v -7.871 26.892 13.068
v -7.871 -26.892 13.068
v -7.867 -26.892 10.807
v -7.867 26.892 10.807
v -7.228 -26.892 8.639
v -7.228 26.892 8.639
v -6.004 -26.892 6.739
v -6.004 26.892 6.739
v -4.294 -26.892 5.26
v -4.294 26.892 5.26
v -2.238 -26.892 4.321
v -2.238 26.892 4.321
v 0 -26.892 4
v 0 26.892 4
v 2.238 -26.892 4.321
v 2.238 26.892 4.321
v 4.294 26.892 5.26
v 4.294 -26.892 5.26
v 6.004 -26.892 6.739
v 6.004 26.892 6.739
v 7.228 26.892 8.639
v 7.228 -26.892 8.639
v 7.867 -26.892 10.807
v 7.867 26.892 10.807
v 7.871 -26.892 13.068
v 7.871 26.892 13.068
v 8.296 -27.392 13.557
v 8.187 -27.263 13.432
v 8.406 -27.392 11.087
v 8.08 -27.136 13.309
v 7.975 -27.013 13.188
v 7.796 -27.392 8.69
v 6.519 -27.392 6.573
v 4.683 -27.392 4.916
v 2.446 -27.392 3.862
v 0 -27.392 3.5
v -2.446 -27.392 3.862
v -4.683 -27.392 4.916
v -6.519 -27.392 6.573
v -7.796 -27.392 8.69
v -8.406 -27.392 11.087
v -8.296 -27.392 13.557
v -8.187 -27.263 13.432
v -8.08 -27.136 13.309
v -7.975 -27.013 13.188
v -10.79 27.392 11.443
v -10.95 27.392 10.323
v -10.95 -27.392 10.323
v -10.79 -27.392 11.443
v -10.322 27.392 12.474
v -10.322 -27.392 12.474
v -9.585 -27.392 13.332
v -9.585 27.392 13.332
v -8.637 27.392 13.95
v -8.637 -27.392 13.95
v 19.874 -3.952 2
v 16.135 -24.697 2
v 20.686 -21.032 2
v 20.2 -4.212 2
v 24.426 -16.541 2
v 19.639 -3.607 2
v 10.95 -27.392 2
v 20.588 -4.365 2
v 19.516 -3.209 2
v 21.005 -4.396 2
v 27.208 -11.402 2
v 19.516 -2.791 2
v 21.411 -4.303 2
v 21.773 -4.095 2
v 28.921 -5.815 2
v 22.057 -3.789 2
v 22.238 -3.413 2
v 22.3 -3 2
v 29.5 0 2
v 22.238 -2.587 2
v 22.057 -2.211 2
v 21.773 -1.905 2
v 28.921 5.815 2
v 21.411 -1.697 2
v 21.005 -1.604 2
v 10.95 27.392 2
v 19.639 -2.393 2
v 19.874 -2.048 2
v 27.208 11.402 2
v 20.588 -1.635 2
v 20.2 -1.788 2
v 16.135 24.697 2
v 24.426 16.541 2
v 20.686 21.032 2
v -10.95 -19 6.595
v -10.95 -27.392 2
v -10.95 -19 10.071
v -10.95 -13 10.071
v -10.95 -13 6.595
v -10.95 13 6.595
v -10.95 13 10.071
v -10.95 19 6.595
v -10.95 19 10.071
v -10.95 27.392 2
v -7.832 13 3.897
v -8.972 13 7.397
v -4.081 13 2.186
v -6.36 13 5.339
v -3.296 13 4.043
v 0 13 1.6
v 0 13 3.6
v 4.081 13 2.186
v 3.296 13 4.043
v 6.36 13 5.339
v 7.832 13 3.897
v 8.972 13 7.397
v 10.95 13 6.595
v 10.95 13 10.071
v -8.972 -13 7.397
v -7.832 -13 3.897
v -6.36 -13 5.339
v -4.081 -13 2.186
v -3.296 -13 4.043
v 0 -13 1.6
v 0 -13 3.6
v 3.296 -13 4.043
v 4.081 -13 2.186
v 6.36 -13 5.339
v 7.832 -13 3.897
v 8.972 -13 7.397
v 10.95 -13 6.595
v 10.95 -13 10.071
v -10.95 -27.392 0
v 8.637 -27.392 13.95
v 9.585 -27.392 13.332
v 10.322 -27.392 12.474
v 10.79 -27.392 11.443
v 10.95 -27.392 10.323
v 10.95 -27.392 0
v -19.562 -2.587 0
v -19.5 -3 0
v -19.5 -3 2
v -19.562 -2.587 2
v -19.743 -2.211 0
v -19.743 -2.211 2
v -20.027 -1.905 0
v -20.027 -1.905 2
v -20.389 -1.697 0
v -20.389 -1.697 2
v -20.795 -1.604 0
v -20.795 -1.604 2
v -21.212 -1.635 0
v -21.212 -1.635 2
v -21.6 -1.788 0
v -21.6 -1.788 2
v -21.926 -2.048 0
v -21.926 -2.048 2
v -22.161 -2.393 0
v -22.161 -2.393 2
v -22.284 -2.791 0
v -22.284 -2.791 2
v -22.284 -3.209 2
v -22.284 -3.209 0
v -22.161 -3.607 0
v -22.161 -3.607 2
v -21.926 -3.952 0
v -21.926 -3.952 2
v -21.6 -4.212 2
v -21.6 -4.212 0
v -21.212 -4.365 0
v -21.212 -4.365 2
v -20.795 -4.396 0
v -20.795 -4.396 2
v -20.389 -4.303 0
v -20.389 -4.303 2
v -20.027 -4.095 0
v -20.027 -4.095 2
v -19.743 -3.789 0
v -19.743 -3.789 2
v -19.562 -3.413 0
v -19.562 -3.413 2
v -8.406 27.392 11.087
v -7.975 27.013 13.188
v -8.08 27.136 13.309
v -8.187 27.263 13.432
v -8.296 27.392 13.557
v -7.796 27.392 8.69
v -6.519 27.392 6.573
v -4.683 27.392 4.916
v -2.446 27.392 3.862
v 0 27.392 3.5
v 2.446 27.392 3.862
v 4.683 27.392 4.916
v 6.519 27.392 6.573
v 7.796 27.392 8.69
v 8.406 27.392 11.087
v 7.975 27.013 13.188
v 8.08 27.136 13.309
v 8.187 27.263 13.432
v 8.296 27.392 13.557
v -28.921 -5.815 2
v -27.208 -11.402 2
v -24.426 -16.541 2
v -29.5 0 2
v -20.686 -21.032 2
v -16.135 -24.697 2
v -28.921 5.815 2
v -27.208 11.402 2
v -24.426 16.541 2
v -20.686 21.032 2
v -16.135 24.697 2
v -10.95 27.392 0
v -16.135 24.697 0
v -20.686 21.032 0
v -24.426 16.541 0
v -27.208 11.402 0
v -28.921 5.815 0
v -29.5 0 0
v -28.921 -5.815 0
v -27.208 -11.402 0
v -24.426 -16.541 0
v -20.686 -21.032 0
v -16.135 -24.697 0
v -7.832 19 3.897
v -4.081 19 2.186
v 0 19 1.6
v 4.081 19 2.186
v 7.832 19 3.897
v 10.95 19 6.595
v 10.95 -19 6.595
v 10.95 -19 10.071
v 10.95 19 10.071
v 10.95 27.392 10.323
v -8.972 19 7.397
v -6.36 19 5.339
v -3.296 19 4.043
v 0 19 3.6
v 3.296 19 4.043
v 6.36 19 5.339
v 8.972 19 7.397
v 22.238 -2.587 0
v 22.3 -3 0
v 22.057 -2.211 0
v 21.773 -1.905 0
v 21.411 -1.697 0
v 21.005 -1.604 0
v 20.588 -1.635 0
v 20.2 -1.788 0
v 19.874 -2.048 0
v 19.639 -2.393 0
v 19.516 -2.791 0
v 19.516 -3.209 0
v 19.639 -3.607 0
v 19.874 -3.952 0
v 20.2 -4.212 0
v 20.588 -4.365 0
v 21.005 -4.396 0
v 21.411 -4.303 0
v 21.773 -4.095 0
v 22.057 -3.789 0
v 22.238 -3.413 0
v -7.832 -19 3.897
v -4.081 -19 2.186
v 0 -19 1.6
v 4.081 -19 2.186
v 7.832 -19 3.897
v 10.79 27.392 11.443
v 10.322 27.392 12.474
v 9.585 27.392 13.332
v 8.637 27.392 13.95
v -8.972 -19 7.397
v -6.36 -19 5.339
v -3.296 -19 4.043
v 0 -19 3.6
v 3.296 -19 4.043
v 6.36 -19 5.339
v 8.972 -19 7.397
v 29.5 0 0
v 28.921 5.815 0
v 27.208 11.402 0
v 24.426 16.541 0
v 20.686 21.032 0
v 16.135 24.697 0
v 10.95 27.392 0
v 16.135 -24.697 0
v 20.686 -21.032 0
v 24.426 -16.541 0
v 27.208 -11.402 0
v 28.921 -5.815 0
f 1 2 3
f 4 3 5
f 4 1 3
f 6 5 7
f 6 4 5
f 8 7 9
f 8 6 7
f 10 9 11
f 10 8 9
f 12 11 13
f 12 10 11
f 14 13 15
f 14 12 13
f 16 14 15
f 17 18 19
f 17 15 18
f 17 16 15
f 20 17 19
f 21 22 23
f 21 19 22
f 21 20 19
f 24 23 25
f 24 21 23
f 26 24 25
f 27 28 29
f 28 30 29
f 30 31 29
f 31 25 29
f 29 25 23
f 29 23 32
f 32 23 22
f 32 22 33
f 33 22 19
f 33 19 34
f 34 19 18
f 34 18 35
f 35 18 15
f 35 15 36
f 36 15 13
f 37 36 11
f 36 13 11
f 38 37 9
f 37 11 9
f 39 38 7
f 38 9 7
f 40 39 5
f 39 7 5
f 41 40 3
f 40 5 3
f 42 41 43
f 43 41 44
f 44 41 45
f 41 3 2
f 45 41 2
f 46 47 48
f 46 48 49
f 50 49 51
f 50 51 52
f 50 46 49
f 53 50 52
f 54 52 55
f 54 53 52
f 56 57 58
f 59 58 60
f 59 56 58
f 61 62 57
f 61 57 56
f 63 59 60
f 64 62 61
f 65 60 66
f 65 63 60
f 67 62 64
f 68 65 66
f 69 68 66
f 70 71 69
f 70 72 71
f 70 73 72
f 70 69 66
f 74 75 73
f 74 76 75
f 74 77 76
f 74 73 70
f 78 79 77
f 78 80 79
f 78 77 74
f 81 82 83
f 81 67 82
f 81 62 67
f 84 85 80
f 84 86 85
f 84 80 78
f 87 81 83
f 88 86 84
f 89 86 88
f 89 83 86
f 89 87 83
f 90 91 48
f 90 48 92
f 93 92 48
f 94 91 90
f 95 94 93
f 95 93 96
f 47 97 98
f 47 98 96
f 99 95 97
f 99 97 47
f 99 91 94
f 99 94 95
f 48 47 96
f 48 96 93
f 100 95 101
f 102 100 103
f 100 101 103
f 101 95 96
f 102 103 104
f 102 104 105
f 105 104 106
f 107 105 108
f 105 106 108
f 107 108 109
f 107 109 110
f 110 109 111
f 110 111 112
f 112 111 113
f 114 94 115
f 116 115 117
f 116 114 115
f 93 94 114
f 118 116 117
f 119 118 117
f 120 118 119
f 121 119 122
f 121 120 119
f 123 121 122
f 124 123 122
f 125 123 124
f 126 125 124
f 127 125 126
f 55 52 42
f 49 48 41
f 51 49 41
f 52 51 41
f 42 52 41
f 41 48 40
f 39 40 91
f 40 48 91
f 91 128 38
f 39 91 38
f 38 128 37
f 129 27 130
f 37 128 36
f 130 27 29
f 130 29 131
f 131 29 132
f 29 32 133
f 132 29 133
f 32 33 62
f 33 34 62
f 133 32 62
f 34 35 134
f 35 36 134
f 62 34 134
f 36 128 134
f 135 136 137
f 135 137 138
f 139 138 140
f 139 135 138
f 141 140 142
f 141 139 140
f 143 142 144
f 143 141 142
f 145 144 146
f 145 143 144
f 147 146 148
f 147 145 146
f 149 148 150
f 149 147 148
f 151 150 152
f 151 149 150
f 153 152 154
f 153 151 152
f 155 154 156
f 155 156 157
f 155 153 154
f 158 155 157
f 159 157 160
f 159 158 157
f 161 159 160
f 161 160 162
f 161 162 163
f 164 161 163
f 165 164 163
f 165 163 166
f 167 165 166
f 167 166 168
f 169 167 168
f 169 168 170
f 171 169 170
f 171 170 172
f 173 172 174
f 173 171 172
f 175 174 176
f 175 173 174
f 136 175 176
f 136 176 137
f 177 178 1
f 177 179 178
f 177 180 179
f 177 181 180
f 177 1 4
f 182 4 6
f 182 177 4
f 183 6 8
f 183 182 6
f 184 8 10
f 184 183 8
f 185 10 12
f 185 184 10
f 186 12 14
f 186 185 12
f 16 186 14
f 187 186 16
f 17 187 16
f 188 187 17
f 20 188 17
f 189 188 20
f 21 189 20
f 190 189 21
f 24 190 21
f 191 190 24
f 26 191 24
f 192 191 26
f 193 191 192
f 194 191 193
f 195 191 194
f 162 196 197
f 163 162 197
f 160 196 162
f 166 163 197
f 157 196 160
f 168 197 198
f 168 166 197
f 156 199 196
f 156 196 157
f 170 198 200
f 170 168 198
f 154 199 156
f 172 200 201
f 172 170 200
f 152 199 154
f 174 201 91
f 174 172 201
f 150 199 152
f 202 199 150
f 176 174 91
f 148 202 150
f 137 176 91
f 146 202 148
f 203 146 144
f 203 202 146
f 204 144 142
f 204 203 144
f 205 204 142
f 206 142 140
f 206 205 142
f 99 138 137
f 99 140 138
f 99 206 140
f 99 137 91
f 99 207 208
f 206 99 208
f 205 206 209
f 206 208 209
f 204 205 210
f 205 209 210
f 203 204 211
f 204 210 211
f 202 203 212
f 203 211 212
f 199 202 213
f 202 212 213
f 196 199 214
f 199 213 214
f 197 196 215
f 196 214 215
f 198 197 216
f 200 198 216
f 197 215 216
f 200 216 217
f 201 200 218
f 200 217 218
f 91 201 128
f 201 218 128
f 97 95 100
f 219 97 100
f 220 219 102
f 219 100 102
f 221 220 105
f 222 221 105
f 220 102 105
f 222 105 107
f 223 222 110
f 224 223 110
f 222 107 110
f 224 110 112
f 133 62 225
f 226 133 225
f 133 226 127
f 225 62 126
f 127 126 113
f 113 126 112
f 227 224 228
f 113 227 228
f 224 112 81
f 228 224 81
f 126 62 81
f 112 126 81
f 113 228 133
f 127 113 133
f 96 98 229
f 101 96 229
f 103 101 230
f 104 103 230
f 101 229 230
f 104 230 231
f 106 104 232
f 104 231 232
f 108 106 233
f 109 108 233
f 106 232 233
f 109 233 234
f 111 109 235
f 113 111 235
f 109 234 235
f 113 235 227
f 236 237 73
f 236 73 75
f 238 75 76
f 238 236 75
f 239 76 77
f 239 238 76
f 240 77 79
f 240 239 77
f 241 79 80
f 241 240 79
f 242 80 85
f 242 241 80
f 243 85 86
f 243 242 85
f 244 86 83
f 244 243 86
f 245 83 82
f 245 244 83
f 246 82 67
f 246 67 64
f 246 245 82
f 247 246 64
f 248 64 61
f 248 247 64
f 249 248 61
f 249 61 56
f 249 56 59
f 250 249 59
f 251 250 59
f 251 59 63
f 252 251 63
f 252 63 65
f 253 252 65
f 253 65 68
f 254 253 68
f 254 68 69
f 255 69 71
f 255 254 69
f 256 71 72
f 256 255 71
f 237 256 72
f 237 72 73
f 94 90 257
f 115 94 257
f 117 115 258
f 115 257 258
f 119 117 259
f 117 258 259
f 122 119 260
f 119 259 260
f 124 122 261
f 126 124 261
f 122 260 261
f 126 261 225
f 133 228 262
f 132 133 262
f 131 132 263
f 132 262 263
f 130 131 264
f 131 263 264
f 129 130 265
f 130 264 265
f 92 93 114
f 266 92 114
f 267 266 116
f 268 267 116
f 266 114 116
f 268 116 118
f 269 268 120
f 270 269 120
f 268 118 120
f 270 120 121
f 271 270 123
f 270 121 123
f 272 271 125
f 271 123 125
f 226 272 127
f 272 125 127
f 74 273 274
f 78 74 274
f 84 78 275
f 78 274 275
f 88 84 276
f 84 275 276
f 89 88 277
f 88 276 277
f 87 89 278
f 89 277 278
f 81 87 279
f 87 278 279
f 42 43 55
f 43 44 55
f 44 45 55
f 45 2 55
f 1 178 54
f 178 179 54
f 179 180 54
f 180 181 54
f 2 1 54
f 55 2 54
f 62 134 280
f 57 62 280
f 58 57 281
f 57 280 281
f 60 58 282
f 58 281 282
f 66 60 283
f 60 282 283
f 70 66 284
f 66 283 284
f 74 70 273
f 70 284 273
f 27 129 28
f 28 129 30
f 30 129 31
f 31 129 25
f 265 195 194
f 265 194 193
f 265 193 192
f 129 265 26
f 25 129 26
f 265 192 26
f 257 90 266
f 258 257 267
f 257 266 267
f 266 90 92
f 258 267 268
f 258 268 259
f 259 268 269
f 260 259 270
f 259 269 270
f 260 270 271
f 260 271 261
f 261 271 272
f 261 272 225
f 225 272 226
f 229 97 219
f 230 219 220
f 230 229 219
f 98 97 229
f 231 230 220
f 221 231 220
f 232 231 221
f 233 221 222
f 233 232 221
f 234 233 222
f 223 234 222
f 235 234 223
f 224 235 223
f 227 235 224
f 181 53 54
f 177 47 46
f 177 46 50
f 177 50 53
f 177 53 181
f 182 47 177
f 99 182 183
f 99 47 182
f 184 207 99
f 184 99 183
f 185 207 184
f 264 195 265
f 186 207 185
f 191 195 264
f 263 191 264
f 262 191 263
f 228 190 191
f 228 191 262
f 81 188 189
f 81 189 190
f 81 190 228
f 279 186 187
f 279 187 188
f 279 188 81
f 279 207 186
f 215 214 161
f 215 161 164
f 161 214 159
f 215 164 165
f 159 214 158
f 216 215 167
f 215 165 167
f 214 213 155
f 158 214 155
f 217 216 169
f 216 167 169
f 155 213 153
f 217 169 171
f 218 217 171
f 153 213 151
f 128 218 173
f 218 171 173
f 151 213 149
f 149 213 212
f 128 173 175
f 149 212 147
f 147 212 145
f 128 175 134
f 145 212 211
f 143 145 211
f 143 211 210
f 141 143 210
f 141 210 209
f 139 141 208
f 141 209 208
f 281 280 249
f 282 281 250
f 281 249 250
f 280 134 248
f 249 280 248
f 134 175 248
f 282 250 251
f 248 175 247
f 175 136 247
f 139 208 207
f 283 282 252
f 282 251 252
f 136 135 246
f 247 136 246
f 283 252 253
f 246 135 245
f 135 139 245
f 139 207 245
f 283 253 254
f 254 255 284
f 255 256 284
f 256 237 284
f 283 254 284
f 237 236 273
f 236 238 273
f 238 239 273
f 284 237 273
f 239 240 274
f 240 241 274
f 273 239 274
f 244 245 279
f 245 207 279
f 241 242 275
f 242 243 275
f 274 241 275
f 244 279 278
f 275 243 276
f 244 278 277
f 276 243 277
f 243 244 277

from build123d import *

# Parameters (mm, degrees)
F0_W          = 21.9
F0_H          = 54.784943187
F2_DEPTH      = 13.95
F0_R          = 1.4
F3_DEPTH      = 2
F1_R          = 7.95
F4_DEPTH      = 27.3934715935
F4_DEPTH_BACK = 27.3934715935
F7_R          = 14.5
F7_R_2        = 12.5
F8_R          = 14.5
F8_R_2        = 12.5
F9_DEPTH      = 3
F10_T1_DEPTH  = 59.6298977105
F11_T1_DEPTH  = 72.9200798033
F12_SIZE      = 0.5


# Not quite as in the source:
# - a fillet or chamfer that OpenCascade refuses, or shapes differently, is made with other operations: its cross-section is extruded or revolved along the edge and cut away or added


with BuildPart() as f2:
    # F0 (on Top) → F2 (new body)
    with BuildSketch(Plane.XY):
        Rectangle(F0_W, F0_H)
    extrude(amount=F2_DEPTH)

    # F0 (on Top) → F3 (join)
    with BuildSketch(Plane.XY):
        with BuildLine():
            ThreePointArc((10.95, -27.3924715935), (24.4261642507, -16.5412363504), (29.5, 0))
            ThreePointArc((29.5, 0), (24.4261642507, 16.5412363504), (10.95, 27.3924715935))
            Line((10.95, 27.3924715935), (10.95, -27.3924715935))
        make_face()
        with Locations((20.9, -3)):
            Circle(F0_R, mode=Mode.SUBTRACT)
        with BuildLine():
            Line((-10.95, -27.3924715935), (-10.95, 27.3924715935))
            ThreePointArc((-10.95, 27.3924715935), (-29.5, 0), (-10.95, -27.3924715935))
        make_face()
        with Locations((-20.9, -3)):
            Circle(F0_R, mode=Mode.SUBTRACT)
    extrude(amount=F3_DEPTH)

    # F1 (on Front) → F4 (cut, two sides)
    with BuildSketch(Plane.XZ) as f4_sk:
        with Locations((0, 11.95)):
            Circle(F1_R)
    extrude(amount=-F4_DEPTH, mode=Mode.SUBTRACT)
    extrude(f4_sk.sketch, amount=F4_DEPTH_BACK, mode=Mode.SUBTRACT)

    # F7 (on offset) + F8 (on offset) → F9 (cut, symmetric)
    with BuildSketch(Plane.XZ.offset(16)):
        with Locations((0, 16.1)):
            Circle(F7_R)
        with Locations((0, 16.1)):
            Circle(F7_R_2, mode=Mode.SUBTRACT)
    with BuildSketch(Plane.XZ.offset(-16)):
        with Locations((0, 16.1)):
            Circle(F8_R)
        with Locations((0, 16.1)):
            Circle(F8_R_2, mode=Mode.SUBTRACT)
    extrude(amount=F9_DEPTH, both=True, mode=Mode.SUBTRACT)

    # F10: chamfer of 1 on 2 edges, made by hand

    # F10_s2 → F10_t1 (cut)
    with BuildSketch(Plane.XZ.offset(-29.8149488552)):
        with BuildLine():
            Line((-7.8447816072, 13.0377503134), (-8.6628360241, 13.9802075969))
            Line((-8.6628360241, 13.9802075969), (-8.6628360241, 14.0002075969))
            ThreePointArc((-8.6628360241, 14.0002075969), (-8.178576054, 13.97), (-7.694316084, 13.97))
            Line((-7.694316084, 13.97), (-7.6749593139, 13.9449685535))
            ThreePointArc((-7.6749593139, 13.9449685535), (-7.7779305741, 13.4955406772), (-7.8249803447, 13.0349378407))
            Line((-7.8249803447, 13.0349378407), (-7.8447816072, 13.0377503134))
        make_face()
        with BuildLine():
            Line((8.6628360241, 13.9802075969), (7.8447816072, 13.0377503134))
            Line((7.8447816072, 13.0377503134), (7.8249803447, 13.0349378407))
            ThreePointArc((7.8249803447, 13.0349378407), (7.7779305741, 13.4955406772), (7.6749593139, 13.9449685535))
            Line((7.6749593139, 13.9449685535), (7.694316084, 13.97))
            ThreePointArc((7.694316084, 13.97), (8.178576054, 13.97), (8.6628360241, 14.0002075969))
            Line((8.6628360241, 14.0002075969), (8.6628360241, 13.9802075969))
        make_face()
    extrude(amount=F10_T1_DEPTH, mode=Mode.SUBTRACT)

    # F11: fillet of radius 4 on 2 edges, made by hand

    # F11_s2 → F11_t1 (cut)
    with BuildSketch(Plane.XZ.offset(-36.4600399016)):
        with BuildLine():
            ThreePointArc((10.95, 10.3229726767), (10.3224222102, 12.4739651072), (8.6366157821, 13.95))
            Line((8.6366157821, 13.95), (10.95, 13.95))
            Line((10.95, 13.95), (10.95, 10.3229726767))
        make_face()
        with BuildLine():
            ThreePointArc((-10.95, 10.3229726767), (-10.3224222102, 12.4739651072), (-8.6366157821, 13.95))
            Line((-8.6366157821, 13.95), (-10.95, 13.95))
            Line((-10.95, 13.95), (-10.95, 10.3229726767))
        make_face()
    extrude(amount=F11_T1_DEPTH, mode=Mode.SUBTRACT)

    # F12
    f12_edges = [f2.edges().sort_by_distance(p)[0] for p in [
        (0, 27.392472, 4),
        (0, -27.392472, 4),
    ]]
    chamfer(f12_edges, length=F12_SIZE)


solid = f2.part
